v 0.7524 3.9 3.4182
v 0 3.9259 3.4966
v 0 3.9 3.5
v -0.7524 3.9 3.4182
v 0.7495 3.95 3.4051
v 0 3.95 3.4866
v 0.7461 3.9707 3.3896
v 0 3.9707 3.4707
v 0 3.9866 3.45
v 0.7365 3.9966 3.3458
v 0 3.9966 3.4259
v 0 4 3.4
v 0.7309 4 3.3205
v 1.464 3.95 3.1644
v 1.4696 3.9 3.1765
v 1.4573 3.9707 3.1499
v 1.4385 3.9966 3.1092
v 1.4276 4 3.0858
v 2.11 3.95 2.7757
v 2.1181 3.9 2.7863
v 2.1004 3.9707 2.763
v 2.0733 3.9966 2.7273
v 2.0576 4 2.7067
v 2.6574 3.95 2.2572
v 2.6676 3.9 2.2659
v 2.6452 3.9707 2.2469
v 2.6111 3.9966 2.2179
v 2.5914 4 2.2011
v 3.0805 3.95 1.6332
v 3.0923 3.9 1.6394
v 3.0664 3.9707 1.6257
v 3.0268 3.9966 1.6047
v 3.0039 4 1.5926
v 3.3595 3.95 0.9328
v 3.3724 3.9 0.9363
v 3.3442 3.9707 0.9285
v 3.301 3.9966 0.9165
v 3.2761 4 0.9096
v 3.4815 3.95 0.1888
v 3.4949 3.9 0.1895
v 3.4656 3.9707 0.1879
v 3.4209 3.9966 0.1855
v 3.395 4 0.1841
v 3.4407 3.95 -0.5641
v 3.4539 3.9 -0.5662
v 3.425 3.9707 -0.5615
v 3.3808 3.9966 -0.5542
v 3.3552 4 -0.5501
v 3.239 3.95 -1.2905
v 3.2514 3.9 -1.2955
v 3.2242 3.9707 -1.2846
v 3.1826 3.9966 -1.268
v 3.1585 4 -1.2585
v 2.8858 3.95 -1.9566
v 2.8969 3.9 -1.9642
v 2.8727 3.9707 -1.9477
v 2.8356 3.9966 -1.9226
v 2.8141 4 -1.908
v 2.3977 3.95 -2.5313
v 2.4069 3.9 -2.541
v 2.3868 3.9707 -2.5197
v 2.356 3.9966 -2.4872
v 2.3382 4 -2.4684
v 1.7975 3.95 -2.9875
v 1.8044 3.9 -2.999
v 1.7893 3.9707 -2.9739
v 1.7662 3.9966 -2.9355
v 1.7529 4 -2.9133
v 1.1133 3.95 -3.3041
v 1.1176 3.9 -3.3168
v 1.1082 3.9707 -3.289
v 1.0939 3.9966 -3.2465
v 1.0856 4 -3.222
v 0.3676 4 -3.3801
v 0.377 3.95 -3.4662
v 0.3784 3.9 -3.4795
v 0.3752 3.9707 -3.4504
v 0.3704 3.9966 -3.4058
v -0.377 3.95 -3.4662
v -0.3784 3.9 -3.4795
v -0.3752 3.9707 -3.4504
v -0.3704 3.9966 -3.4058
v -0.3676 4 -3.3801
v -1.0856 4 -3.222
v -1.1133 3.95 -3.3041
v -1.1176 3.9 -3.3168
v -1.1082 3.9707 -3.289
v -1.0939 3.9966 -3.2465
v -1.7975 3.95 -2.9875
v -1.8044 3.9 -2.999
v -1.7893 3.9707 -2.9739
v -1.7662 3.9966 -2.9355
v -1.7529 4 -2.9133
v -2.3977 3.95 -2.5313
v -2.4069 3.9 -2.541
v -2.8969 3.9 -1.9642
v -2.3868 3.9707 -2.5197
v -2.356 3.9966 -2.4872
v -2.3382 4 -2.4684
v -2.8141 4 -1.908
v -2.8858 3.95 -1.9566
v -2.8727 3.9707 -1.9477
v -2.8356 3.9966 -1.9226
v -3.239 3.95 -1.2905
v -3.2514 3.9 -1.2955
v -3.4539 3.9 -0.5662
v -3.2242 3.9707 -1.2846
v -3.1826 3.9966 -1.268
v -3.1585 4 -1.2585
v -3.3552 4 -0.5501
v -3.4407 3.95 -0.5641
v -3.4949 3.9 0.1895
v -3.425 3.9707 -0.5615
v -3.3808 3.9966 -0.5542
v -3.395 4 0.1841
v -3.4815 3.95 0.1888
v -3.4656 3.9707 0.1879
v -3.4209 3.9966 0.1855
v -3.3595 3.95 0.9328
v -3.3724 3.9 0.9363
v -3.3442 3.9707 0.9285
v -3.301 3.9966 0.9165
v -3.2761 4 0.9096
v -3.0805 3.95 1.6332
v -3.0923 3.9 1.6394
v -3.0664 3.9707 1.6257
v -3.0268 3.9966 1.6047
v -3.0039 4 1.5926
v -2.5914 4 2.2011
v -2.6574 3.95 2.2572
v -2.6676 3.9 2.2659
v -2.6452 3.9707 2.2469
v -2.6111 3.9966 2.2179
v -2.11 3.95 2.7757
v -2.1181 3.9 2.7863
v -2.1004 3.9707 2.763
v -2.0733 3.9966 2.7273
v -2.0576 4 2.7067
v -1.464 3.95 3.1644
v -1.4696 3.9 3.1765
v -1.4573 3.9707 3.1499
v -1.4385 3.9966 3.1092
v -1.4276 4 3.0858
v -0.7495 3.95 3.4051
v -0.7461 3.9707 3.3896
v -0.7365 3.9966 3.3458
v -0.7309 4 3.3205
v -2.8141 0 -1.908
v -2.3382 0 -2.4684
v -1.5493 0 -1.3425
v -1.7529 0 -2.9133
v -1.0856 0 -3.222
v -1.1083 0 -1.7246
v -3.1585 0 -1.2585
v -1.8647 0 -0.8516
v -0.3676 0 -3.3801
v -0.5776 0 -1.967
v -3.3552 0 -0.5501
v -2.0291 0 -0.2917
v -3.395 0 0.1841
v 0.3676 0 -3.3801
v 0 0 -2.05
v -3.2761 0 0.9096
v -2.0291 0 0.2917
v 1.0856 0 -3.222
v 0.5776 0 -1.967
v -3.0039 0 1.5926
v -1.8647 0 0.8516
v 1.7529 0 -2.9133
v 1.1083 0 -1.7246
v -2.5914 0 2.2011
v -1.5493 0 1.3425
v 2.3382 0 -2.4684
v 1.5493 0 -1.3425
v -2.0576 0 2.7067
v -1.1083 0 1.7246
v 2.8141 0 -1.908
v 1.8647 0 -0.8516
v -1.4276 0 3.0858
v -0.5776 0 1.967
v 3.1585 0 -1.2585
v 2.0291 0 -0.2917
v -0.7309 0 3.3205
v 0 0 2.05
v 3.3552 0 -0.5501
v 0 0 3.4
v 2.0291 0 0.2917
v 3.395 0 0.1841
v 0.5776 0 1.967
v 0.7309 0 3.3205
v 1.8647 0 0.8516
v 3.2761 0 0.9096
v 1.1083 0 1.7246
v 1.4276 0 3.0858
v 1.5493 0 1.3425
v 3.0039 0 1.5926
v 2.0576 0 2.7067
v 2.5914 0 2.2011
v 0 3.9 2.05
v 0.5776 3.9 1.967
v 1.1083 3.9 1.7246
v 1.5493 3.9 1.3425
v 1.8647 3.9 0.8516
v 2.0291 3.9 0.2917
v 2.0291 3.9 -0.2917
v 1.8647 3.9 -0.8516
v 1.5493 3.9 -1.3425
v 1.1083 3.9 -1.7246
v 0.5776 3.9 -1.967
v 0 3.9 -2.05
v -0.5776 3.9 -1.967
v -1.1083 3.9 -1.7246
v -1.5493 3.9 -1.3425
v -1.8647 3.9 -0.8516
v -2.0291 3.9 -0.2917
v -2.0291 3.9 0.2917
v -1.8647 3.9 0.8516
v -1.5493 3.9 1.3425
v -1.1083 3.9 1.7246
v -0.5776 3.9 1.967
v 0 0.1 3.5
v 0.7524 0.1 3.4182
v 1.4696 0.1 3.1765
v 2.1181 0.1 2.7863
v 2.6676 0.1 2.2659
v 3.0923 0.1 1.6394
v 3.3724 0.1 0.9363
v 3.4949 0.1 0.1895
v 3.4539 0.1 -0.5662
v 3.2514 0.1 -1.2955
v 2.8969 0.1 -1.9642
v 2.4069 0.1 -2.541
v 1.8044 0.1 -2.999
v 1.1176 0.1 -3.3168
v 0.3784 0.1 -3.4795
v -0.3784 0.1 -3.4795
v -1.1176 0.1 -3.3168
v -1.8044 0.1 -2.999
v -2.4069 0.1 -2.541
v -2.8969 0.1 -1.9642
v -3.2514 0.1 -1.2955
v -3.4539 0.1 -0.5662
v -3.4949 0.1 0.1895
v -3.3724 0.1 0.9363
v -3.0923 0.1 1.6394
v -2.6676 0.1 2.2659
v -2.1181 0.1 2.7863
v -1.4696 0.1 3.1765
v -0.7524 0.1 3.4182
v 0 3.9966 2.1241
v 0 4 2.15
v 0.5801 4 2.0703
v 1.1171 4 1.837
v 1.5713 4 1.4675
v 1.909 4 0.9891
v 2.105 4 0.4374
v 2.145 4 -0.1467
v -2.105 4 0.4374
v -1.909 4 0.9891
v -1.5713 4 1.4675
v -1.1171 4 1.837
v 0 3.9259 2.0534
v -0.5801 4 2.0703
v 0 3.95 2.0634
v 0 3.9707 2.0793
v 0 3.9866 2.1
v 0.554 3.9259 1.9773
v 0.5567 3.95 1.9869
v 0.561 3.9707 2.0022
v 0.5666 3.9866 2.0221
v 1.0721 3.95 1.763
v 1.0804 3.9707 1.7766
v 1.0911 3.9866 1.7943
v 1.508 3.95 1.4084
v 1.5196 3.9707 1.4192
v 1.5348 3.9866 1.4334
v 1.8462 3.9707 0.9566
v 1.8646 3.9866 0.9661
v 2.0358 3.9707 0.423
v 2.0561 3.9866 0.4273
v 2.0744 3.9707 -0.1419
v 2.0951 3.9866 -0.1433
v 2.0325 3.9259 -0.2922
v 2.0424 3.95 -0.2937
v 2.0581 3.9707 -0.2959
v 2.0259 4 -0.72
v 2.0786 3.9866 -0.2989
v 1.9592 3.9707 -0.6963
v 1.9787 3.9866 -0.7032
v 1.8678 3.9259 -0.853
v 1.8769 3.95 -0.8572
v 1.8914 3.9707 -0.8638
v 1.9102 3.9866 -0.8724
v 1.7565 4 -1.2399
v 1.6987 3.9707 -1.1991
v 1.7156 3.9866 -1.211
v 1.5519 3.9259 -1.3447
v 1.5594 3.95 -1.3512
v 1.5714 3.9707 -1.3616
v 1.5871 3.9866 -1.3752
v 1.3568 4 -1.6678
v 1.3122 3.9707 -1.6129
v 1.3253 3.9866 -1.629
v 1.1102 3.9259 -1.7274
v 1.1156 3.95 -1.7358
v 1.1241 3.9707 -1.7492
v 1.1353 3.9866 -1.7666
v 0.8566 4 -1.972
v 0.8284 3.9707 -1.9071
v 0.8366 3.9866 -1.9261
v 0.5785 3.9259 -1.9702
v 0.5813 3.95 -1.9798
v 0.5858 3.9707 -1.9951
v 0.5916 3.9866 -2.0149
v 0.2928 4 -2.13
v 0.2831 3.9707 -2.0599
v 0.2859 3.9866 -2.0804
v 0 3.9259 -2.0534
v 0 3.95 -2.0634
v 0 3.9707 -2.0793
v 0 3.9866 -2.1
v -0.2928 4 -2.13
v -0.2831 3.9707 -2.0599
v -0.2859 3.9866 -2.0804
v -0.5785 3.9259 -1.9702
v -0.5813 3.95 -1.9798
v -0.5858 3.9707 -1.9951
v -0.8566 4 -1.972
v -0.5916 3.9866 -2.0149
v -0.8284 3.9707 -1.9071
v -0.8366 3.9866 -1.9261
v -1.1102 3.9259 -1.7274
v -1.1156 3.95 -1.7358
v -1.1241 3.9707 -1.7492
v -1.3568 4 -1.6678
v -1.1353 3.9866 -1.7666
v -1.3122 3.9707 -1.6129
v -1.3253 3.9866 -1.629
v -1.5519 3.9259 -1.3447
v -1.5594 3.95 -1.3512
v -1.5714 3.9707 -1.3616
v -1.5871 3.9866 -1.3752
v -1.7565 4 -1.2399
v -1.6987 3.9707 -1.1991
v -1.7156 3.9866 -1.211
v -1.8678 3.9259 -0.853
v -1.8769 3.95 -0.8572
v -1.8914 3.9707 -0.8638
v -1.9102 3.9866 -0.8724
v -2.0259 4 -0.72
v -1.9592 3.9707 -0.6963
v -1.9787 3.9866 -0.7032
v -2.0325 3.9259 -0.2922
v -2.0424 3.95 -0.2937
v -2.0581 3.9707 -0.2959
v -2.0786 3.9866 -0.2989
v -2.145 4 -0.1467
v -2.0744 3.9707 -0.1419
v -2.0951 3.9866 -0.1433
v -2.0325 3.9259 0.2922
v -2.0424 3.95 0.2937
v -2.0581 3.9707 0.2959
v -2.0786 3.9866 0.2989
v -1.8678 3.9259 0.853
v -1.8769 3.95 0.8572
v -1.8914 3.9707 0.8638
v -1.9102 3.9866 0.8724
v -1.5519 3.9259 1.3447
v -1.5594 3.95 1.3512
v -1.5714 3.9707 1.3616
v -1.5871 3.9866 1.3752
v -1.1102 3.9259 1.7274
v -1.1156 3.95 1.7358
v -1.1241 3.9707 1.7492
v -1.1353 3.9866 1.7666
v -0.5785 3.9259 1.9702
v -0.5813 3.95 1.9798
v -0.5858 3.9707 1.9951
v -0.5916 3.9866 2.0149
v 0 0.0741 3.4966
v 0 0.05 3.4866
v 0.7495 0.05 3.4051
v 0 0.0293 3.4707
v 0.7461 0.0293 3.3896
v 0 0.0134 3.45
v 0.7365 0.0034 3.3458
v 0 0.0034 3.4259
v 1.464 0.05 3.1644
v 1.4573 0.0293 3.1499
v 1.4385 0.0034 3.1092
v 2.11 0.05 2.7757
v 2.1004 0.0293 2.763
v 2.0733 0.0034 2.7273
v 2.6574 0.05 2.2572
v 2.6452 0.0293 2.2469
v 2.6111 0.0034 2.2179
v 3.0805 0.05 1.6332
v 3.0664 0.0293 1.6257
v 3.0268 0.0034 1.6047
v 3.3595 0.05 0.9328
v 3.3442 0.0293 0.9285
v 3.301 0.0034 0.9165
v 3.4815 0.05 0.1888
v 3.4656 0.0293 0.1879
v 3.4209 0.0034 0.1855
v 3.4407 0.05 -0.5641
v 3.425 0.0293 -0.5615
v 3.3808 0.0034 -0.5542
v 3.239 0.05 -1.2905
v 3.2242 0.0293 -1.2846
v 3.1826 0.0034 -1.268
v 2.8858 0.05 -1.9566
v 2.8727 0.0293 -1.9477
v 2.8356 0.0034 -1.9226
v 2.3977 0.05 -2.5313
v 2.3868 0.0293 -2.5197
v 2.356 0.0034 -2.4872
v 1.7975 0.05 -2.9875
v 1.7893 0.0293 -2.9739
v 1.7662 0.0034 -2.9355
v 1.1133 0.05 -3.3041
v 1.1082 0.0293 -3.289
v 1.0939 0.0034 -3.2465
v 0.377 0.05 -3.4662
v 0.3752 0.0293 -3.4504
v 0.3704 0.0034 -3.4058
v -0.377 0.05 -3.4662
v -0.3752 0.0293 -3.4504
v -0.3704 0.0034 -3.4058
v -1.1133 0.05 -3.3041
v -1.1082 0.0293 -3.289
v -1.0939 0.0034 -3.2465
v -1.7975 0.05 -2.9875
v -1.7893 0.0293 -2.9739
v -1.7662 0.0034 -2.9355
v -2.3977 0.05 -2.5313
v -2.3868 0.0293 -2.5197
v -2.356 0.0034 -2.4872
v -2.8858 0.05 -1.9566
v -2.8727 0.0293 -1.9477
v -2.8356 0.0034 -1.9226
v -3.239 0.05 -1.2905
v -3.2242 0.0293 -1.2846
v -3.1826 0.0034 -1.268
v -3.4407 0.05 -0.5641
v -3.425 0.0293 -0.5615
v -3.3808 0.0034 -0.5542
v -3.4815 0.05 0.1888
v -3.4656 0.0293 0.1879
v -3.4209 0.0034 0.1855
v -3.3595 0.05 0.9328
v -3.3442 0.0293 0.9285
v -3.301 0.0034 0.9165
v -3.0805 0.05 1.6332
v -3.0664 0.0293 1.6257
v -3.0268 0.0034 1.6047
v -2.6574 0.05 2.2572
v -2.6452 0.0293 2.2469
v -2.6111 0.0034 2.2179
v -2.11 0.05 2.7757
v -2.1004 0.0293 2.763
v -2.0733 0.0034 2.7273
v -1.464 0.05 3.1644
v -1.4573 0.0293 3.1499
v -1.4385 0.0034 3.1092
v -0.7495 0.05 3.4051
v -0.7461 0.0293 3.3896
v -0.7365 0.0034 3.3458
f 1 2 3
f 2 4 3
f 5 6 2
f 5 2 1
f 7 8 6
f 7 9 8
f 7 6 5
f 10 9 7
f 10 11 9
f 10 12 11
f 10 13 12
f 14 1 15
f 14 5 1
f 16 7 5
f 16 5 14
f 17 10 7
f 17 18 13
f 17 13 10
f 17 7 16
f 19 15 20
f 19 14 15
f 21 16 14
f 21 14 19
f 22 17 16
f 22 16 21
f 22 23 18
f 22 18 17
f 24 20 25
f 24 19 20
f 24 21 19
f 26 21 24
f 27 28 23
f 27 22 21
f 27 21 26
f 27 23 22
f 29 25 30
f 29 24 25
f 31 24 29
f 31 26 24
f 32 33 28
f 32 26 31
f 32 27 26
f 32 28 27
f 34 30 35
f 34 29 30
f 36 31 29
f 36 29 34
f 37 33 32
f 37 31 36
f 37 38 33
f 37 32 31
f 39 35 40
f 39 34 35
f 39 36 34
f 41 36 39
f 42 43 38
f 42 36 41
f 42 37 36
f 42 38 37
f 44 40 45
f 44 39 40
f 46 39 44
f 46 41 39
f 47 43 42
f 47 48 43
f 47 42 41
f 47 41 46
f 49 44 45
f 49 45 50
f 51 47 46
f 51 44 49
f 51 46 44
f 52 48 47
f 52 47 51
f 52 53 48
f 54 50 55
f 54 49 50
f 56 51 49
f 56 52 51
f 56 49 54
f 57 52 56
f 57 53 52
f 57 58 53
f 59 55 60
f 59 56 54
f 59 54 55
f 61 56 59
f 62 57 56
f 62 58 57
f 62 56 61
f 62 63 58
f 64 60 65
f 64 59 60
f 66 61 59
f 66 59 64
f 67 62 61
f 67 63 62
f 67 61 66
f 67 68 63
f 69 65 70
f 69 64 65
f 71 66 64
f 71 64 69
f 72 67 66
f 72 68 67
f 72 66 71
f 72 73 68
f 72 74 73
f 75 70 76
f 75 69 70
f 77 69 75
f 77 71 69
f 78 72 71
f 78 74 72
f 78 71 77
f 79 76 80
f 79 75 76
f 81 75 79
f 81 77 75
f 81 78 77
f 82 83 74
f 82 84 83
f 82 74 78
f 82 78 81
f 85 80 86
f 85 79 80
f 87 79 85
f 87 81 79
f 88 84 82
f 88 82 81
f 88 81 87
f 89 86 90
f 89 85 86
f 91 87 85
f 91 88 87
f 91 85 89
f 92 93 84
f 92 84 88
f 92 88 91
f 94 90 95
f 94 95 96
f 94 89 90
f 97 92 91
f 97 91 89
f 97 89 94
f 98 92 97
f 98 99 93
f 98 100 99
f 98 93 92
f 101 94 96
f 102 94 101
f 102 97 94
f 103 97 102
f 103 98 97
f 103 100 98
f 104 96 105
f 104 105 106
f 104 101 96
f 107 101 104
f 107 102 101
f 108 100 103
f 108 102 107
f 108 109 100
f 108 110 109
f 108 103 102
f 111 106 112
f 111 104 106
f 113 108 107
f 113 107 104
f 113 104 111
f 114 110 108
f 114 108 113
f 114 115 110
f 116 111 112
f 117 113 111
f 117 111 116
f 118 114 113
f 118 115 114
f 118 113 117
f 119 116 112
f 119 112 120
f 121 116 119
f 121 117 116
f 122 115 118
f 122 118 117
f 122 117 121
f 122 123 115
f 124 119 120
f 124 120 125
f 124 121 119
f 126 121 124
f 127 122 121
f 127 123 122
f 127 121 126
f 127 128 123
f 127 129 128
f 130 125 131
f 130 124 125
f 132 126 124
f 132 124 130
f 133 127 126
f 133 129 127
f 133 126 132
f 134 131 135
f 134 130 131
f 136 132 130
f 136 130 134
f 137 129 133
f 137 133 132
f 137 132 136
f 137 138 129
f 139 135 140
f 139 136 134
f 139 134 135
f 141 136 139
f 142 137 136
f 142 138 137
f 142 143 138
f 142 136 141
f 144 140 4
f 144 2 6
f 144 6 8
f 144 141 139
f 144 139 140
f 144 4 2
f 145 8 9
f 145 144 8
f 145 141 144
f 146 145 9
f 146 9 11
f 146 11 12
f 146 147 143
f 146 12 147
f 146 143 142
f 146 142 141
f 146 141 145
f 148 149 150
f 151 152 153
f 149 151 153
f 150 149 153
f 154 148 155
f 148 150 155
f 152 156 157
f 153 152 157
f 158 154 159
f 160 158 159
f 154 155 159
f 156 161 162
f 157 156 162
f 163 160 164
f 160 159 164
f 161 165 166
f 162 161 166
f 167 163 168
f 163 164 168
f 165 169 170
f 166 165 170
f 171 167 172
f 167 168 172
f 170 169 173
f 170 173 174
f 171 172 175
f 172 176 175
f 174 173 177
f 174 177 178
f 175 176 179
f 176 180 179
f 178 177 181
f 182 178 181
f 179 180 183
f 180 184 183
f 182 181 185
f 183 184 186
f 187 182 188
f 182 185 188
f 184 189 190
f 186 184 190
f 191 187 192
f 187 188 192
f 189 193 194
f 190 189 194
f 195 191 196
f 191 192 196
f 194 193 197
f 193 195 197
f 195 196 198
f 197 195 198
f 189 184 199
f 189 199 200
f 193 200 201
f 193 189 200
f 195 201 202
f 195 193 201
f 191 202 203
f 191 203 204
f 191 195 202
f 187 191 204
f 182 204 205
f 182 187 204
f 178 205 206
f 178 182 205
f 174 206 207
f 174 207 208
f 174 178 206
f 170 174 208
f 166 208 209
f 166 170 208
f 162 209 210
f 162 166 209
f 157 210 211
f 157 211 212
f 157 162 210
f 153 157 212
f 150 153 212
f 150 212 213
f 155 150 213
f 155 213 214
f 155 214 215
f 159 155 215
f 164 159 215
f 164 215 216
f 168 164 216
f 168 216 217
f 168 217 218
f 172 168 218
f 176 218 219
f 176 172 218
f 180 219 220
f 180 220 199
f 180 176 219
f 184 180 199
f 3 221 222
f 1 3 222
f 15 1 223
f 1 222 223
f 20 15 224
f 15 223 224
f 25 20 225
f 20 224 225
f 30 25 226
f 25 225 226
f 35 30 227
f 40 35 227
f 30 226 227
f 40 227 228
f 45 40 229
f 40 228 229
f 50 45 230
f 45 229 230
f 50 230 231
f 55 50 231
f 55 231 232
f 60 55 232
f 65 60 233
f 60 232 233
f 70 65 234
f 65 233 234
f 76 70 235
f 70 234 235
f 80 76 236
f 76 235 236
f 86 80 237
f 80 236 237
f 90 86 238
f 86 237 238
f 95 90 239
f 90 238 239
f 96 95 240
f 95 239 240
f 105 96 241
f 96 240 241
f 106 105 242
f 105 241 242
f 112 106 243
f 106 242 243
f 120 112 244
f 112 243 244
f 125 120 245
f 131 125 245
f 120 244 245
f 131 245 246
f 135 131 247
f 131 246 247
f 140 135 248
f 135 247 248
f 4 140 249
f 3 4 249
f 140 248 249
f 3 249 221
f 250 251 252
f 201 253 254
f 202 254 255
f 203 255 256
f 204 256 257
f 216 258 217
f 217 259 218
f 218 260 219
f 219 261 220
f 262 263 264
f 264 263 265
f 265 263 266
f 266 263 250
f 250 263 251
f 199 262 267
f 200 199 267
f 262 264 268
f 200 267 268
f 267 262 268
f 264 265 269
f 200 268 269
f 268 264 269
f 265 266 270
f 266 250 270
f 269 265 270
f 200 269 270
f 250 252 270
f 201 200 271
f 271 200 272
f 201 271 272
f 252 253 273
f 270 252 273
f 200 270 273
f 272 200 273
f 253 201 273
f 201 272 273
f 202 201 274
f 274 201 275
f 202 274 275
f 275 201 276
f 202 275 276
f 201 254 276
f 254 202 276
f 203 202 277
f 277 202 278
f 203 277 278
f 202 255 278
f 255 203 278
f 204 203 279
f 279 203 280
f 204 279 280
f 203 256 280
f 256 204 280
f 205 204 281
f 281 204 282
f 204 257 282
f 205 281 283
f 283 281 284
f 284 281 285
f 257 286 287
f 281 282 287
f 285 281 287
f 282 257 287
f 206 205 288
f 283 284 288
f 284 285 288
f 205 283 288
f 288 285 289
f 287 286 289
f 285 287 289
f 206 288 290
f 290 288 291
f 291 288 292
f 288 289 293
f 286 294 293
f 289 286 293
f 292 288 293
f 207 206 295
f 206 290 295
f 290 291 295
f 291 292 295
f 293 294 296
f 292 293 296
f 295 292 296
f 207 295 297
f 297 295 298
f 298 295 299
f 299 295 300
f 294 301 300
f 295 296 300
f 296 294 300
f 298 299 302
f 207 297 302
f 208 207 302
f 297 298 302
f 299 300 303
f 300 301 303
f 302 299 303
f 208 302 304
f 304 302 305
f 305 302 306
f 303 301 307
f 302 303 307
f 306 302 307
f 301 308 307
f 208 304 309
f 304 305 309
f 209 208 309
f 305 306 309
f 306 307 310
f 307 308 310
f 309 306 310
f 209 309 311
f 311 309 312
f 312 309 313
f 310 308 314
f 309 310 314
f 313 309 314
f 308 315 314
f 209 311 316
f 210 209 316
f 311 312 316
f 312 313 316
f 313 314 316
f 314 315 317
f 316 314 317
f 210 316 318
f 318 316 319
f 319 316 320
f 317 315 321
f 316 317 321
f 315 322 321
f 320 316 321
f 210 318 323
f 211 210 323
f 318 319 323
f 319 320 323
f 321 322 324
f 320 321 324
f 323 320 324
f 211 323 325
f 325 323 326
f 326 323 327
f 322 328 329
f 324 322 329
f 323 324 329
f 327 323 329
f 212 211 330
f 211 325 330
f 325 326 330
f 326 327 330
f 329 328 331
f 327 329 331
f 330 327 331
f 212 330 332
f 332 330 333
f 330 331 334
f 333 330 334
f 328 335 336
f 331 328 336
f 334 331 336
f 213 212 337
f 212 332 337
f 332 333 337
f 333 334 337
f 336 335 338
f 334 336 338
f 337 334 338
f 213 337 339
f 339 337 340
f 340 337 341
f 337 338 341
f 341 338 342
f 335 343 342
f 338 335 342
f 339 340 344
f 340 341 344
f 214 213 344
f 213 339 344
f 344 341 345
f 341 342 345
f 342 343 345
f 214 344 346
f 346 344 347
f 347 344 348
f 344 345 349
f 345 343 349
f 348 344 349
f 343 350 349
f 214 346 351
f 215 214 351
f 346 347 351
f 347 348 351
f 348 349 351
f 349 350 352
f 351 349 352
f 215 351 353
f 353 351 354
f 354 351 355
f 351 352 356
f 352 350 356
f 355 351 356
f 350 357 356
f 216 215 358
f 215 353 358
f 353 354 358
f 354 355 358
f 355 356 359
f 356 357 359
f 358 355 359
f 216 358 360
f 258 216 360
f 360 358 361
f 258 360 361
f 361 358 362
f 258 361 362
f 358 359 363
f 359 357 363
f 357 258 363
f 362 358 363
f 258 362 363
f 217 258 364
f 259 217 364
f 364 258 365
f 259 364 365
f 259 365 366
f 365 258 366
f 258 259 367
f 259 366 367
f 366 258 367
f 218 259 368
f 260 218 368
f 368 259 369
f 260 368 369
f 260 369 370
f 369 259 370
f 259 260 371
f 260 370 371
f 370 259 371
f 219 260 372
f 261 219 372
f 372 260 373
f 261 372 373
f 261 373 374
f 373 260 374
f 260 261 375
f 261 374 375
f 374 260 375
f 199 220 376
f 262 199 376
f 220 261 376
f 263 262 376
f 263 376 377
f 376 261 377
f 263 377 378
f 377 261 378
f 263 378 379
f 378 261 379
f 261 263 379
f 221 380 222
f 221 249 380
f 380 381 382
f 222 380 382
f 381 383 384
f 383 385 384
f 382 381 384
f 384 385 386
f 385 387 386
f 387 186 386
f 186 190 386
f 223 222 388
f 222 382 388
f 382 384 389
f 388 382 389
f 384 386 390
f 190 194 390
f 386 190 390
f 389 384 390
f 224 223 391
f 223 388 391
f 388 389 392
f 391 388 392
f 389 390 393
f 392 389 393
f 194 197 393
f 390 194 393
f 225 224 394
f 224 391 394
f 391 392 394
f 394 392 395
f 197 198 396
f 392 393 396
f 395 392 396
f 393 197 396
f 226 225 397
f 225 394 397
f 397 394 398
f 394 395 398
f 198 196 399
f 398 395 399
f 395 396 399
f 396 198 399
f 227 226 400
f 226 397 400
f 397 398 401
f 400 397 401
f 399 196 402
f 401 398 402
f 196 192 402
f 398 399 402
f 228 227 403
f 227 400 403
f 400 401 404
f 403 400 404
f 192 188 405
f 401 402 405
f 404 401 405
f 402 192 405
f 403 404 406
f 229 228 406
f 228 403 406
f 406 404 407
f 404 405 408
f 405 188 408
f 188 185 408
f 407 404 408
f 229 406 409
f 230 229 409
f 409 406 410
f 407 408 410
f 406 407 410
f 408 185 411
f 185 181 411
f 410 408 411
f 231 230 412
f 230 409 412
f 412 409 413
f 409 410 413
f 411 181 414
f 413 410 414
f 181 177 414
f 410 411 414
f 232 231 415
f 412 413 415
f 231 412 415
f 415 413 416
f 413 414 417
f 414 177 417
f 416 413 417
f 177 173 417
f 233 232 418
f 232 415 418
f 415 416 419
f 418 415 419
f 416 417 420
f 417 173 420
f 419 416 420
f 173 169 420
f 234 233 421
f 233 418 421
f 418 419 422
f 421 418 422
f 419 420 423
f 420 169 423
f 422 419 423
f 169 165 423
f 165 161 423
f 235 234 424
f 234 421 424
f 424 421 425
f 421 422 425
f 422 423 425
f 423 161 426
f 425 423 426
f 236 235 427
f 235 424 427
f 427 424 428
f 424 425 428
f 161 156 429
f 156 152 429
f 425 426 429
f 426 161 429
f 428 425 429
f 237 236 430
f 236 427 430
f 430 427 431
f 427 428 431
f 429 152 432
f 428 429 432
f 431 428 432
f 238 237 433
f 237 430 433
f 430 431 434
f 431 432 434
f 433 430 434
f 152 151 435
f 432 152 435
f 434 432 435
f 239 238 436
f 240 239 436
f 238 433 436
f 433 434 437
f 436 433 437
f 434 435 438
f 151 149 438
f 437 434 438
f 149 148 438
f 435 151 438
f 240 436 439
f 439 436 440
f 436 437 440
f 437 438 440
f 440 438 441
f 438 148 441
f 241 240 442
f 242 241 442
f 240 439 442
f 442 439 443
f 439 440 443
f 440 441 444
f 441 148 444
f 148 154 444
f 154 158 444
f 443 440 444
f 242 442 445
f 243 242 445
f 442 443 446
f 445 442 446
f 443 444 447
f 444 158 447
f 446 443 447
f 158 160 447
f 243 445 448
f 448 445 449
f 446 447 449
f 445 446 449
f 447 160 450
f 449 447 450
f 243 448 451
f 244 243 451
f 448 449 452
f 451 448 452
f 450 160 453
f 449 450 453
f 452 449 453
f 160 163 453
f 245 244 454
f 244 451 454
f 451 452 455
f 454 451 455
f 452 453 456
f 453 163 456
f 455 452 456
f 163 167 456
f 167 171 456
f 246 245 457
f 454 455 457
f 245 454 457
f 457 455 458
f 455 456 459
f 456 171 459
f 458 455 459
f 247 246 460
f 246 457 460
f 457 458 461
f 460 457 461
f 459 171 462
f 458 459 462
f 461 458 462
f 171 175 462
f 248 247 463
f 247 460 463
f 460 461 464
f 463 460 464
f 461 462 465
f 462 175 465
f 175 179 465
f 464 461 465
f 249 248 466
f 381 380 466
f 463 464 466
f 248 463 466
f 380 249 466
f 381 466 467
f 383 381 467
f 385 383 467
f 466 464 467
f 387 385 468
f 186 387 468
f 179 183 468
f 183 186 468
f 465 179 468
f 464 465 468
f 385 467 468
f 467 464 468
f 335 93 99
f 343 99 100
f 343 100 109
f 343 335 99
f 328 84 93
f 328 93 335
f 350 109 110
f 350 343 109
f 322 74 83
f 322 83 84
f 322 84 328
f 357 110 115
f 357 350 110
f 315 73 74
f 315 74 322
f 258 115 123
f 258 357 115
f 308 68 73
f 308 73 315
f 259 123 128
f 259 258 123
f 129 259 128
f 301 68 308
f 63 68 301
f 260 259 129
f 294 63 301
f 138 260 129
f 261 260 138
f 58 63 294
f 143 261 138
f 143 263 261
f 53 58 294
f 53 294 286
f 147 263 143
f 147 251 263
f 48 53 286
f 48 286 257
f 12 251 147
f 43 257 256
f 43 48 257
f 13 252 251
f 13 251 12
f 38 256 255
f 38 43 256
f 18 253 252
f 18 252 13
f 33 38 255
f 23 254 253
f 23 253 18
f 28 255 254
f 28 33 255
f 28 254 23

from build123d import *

# Parameters (mm, degrees)
SKETCH1_R           = 3.5
SKETCH1_R_2         = 2.05
BOSS_EXTRUDE1_DEPTH = 4
FILLET1_R           = 0.1


with BuildPart() as part:
    # Sketch1 → Boss-Extrude1 (new body)
    with BuildSketch(Plane(origin=(0, 0, 0), x_dir=(1, 0, 0), z_dir=(0, 1, 0))):
        with Locations(Location((0, 0, 0), (0, 0, 270))):
            Circle(SKETCH1_R)
        with Locations(Location((0, 0, 0), (0, 0, 270))):
            Circle(SKETCH1_R_2, mode=Mode.SUBTRACT)
    extrude(amount=BOSS_EXTRUDE1_DEPTH)

    # Fillet1
    fillet1_edges = [part.edges().sort_by_distance(p)[0] for p in [
        (0, 0, -3.5),
        (0, 4, -3.5),
        (0, 4, -2.05),
    ]]
    fillet(fillet1_edges, radius=FILLET1_R)


solid = part.part
